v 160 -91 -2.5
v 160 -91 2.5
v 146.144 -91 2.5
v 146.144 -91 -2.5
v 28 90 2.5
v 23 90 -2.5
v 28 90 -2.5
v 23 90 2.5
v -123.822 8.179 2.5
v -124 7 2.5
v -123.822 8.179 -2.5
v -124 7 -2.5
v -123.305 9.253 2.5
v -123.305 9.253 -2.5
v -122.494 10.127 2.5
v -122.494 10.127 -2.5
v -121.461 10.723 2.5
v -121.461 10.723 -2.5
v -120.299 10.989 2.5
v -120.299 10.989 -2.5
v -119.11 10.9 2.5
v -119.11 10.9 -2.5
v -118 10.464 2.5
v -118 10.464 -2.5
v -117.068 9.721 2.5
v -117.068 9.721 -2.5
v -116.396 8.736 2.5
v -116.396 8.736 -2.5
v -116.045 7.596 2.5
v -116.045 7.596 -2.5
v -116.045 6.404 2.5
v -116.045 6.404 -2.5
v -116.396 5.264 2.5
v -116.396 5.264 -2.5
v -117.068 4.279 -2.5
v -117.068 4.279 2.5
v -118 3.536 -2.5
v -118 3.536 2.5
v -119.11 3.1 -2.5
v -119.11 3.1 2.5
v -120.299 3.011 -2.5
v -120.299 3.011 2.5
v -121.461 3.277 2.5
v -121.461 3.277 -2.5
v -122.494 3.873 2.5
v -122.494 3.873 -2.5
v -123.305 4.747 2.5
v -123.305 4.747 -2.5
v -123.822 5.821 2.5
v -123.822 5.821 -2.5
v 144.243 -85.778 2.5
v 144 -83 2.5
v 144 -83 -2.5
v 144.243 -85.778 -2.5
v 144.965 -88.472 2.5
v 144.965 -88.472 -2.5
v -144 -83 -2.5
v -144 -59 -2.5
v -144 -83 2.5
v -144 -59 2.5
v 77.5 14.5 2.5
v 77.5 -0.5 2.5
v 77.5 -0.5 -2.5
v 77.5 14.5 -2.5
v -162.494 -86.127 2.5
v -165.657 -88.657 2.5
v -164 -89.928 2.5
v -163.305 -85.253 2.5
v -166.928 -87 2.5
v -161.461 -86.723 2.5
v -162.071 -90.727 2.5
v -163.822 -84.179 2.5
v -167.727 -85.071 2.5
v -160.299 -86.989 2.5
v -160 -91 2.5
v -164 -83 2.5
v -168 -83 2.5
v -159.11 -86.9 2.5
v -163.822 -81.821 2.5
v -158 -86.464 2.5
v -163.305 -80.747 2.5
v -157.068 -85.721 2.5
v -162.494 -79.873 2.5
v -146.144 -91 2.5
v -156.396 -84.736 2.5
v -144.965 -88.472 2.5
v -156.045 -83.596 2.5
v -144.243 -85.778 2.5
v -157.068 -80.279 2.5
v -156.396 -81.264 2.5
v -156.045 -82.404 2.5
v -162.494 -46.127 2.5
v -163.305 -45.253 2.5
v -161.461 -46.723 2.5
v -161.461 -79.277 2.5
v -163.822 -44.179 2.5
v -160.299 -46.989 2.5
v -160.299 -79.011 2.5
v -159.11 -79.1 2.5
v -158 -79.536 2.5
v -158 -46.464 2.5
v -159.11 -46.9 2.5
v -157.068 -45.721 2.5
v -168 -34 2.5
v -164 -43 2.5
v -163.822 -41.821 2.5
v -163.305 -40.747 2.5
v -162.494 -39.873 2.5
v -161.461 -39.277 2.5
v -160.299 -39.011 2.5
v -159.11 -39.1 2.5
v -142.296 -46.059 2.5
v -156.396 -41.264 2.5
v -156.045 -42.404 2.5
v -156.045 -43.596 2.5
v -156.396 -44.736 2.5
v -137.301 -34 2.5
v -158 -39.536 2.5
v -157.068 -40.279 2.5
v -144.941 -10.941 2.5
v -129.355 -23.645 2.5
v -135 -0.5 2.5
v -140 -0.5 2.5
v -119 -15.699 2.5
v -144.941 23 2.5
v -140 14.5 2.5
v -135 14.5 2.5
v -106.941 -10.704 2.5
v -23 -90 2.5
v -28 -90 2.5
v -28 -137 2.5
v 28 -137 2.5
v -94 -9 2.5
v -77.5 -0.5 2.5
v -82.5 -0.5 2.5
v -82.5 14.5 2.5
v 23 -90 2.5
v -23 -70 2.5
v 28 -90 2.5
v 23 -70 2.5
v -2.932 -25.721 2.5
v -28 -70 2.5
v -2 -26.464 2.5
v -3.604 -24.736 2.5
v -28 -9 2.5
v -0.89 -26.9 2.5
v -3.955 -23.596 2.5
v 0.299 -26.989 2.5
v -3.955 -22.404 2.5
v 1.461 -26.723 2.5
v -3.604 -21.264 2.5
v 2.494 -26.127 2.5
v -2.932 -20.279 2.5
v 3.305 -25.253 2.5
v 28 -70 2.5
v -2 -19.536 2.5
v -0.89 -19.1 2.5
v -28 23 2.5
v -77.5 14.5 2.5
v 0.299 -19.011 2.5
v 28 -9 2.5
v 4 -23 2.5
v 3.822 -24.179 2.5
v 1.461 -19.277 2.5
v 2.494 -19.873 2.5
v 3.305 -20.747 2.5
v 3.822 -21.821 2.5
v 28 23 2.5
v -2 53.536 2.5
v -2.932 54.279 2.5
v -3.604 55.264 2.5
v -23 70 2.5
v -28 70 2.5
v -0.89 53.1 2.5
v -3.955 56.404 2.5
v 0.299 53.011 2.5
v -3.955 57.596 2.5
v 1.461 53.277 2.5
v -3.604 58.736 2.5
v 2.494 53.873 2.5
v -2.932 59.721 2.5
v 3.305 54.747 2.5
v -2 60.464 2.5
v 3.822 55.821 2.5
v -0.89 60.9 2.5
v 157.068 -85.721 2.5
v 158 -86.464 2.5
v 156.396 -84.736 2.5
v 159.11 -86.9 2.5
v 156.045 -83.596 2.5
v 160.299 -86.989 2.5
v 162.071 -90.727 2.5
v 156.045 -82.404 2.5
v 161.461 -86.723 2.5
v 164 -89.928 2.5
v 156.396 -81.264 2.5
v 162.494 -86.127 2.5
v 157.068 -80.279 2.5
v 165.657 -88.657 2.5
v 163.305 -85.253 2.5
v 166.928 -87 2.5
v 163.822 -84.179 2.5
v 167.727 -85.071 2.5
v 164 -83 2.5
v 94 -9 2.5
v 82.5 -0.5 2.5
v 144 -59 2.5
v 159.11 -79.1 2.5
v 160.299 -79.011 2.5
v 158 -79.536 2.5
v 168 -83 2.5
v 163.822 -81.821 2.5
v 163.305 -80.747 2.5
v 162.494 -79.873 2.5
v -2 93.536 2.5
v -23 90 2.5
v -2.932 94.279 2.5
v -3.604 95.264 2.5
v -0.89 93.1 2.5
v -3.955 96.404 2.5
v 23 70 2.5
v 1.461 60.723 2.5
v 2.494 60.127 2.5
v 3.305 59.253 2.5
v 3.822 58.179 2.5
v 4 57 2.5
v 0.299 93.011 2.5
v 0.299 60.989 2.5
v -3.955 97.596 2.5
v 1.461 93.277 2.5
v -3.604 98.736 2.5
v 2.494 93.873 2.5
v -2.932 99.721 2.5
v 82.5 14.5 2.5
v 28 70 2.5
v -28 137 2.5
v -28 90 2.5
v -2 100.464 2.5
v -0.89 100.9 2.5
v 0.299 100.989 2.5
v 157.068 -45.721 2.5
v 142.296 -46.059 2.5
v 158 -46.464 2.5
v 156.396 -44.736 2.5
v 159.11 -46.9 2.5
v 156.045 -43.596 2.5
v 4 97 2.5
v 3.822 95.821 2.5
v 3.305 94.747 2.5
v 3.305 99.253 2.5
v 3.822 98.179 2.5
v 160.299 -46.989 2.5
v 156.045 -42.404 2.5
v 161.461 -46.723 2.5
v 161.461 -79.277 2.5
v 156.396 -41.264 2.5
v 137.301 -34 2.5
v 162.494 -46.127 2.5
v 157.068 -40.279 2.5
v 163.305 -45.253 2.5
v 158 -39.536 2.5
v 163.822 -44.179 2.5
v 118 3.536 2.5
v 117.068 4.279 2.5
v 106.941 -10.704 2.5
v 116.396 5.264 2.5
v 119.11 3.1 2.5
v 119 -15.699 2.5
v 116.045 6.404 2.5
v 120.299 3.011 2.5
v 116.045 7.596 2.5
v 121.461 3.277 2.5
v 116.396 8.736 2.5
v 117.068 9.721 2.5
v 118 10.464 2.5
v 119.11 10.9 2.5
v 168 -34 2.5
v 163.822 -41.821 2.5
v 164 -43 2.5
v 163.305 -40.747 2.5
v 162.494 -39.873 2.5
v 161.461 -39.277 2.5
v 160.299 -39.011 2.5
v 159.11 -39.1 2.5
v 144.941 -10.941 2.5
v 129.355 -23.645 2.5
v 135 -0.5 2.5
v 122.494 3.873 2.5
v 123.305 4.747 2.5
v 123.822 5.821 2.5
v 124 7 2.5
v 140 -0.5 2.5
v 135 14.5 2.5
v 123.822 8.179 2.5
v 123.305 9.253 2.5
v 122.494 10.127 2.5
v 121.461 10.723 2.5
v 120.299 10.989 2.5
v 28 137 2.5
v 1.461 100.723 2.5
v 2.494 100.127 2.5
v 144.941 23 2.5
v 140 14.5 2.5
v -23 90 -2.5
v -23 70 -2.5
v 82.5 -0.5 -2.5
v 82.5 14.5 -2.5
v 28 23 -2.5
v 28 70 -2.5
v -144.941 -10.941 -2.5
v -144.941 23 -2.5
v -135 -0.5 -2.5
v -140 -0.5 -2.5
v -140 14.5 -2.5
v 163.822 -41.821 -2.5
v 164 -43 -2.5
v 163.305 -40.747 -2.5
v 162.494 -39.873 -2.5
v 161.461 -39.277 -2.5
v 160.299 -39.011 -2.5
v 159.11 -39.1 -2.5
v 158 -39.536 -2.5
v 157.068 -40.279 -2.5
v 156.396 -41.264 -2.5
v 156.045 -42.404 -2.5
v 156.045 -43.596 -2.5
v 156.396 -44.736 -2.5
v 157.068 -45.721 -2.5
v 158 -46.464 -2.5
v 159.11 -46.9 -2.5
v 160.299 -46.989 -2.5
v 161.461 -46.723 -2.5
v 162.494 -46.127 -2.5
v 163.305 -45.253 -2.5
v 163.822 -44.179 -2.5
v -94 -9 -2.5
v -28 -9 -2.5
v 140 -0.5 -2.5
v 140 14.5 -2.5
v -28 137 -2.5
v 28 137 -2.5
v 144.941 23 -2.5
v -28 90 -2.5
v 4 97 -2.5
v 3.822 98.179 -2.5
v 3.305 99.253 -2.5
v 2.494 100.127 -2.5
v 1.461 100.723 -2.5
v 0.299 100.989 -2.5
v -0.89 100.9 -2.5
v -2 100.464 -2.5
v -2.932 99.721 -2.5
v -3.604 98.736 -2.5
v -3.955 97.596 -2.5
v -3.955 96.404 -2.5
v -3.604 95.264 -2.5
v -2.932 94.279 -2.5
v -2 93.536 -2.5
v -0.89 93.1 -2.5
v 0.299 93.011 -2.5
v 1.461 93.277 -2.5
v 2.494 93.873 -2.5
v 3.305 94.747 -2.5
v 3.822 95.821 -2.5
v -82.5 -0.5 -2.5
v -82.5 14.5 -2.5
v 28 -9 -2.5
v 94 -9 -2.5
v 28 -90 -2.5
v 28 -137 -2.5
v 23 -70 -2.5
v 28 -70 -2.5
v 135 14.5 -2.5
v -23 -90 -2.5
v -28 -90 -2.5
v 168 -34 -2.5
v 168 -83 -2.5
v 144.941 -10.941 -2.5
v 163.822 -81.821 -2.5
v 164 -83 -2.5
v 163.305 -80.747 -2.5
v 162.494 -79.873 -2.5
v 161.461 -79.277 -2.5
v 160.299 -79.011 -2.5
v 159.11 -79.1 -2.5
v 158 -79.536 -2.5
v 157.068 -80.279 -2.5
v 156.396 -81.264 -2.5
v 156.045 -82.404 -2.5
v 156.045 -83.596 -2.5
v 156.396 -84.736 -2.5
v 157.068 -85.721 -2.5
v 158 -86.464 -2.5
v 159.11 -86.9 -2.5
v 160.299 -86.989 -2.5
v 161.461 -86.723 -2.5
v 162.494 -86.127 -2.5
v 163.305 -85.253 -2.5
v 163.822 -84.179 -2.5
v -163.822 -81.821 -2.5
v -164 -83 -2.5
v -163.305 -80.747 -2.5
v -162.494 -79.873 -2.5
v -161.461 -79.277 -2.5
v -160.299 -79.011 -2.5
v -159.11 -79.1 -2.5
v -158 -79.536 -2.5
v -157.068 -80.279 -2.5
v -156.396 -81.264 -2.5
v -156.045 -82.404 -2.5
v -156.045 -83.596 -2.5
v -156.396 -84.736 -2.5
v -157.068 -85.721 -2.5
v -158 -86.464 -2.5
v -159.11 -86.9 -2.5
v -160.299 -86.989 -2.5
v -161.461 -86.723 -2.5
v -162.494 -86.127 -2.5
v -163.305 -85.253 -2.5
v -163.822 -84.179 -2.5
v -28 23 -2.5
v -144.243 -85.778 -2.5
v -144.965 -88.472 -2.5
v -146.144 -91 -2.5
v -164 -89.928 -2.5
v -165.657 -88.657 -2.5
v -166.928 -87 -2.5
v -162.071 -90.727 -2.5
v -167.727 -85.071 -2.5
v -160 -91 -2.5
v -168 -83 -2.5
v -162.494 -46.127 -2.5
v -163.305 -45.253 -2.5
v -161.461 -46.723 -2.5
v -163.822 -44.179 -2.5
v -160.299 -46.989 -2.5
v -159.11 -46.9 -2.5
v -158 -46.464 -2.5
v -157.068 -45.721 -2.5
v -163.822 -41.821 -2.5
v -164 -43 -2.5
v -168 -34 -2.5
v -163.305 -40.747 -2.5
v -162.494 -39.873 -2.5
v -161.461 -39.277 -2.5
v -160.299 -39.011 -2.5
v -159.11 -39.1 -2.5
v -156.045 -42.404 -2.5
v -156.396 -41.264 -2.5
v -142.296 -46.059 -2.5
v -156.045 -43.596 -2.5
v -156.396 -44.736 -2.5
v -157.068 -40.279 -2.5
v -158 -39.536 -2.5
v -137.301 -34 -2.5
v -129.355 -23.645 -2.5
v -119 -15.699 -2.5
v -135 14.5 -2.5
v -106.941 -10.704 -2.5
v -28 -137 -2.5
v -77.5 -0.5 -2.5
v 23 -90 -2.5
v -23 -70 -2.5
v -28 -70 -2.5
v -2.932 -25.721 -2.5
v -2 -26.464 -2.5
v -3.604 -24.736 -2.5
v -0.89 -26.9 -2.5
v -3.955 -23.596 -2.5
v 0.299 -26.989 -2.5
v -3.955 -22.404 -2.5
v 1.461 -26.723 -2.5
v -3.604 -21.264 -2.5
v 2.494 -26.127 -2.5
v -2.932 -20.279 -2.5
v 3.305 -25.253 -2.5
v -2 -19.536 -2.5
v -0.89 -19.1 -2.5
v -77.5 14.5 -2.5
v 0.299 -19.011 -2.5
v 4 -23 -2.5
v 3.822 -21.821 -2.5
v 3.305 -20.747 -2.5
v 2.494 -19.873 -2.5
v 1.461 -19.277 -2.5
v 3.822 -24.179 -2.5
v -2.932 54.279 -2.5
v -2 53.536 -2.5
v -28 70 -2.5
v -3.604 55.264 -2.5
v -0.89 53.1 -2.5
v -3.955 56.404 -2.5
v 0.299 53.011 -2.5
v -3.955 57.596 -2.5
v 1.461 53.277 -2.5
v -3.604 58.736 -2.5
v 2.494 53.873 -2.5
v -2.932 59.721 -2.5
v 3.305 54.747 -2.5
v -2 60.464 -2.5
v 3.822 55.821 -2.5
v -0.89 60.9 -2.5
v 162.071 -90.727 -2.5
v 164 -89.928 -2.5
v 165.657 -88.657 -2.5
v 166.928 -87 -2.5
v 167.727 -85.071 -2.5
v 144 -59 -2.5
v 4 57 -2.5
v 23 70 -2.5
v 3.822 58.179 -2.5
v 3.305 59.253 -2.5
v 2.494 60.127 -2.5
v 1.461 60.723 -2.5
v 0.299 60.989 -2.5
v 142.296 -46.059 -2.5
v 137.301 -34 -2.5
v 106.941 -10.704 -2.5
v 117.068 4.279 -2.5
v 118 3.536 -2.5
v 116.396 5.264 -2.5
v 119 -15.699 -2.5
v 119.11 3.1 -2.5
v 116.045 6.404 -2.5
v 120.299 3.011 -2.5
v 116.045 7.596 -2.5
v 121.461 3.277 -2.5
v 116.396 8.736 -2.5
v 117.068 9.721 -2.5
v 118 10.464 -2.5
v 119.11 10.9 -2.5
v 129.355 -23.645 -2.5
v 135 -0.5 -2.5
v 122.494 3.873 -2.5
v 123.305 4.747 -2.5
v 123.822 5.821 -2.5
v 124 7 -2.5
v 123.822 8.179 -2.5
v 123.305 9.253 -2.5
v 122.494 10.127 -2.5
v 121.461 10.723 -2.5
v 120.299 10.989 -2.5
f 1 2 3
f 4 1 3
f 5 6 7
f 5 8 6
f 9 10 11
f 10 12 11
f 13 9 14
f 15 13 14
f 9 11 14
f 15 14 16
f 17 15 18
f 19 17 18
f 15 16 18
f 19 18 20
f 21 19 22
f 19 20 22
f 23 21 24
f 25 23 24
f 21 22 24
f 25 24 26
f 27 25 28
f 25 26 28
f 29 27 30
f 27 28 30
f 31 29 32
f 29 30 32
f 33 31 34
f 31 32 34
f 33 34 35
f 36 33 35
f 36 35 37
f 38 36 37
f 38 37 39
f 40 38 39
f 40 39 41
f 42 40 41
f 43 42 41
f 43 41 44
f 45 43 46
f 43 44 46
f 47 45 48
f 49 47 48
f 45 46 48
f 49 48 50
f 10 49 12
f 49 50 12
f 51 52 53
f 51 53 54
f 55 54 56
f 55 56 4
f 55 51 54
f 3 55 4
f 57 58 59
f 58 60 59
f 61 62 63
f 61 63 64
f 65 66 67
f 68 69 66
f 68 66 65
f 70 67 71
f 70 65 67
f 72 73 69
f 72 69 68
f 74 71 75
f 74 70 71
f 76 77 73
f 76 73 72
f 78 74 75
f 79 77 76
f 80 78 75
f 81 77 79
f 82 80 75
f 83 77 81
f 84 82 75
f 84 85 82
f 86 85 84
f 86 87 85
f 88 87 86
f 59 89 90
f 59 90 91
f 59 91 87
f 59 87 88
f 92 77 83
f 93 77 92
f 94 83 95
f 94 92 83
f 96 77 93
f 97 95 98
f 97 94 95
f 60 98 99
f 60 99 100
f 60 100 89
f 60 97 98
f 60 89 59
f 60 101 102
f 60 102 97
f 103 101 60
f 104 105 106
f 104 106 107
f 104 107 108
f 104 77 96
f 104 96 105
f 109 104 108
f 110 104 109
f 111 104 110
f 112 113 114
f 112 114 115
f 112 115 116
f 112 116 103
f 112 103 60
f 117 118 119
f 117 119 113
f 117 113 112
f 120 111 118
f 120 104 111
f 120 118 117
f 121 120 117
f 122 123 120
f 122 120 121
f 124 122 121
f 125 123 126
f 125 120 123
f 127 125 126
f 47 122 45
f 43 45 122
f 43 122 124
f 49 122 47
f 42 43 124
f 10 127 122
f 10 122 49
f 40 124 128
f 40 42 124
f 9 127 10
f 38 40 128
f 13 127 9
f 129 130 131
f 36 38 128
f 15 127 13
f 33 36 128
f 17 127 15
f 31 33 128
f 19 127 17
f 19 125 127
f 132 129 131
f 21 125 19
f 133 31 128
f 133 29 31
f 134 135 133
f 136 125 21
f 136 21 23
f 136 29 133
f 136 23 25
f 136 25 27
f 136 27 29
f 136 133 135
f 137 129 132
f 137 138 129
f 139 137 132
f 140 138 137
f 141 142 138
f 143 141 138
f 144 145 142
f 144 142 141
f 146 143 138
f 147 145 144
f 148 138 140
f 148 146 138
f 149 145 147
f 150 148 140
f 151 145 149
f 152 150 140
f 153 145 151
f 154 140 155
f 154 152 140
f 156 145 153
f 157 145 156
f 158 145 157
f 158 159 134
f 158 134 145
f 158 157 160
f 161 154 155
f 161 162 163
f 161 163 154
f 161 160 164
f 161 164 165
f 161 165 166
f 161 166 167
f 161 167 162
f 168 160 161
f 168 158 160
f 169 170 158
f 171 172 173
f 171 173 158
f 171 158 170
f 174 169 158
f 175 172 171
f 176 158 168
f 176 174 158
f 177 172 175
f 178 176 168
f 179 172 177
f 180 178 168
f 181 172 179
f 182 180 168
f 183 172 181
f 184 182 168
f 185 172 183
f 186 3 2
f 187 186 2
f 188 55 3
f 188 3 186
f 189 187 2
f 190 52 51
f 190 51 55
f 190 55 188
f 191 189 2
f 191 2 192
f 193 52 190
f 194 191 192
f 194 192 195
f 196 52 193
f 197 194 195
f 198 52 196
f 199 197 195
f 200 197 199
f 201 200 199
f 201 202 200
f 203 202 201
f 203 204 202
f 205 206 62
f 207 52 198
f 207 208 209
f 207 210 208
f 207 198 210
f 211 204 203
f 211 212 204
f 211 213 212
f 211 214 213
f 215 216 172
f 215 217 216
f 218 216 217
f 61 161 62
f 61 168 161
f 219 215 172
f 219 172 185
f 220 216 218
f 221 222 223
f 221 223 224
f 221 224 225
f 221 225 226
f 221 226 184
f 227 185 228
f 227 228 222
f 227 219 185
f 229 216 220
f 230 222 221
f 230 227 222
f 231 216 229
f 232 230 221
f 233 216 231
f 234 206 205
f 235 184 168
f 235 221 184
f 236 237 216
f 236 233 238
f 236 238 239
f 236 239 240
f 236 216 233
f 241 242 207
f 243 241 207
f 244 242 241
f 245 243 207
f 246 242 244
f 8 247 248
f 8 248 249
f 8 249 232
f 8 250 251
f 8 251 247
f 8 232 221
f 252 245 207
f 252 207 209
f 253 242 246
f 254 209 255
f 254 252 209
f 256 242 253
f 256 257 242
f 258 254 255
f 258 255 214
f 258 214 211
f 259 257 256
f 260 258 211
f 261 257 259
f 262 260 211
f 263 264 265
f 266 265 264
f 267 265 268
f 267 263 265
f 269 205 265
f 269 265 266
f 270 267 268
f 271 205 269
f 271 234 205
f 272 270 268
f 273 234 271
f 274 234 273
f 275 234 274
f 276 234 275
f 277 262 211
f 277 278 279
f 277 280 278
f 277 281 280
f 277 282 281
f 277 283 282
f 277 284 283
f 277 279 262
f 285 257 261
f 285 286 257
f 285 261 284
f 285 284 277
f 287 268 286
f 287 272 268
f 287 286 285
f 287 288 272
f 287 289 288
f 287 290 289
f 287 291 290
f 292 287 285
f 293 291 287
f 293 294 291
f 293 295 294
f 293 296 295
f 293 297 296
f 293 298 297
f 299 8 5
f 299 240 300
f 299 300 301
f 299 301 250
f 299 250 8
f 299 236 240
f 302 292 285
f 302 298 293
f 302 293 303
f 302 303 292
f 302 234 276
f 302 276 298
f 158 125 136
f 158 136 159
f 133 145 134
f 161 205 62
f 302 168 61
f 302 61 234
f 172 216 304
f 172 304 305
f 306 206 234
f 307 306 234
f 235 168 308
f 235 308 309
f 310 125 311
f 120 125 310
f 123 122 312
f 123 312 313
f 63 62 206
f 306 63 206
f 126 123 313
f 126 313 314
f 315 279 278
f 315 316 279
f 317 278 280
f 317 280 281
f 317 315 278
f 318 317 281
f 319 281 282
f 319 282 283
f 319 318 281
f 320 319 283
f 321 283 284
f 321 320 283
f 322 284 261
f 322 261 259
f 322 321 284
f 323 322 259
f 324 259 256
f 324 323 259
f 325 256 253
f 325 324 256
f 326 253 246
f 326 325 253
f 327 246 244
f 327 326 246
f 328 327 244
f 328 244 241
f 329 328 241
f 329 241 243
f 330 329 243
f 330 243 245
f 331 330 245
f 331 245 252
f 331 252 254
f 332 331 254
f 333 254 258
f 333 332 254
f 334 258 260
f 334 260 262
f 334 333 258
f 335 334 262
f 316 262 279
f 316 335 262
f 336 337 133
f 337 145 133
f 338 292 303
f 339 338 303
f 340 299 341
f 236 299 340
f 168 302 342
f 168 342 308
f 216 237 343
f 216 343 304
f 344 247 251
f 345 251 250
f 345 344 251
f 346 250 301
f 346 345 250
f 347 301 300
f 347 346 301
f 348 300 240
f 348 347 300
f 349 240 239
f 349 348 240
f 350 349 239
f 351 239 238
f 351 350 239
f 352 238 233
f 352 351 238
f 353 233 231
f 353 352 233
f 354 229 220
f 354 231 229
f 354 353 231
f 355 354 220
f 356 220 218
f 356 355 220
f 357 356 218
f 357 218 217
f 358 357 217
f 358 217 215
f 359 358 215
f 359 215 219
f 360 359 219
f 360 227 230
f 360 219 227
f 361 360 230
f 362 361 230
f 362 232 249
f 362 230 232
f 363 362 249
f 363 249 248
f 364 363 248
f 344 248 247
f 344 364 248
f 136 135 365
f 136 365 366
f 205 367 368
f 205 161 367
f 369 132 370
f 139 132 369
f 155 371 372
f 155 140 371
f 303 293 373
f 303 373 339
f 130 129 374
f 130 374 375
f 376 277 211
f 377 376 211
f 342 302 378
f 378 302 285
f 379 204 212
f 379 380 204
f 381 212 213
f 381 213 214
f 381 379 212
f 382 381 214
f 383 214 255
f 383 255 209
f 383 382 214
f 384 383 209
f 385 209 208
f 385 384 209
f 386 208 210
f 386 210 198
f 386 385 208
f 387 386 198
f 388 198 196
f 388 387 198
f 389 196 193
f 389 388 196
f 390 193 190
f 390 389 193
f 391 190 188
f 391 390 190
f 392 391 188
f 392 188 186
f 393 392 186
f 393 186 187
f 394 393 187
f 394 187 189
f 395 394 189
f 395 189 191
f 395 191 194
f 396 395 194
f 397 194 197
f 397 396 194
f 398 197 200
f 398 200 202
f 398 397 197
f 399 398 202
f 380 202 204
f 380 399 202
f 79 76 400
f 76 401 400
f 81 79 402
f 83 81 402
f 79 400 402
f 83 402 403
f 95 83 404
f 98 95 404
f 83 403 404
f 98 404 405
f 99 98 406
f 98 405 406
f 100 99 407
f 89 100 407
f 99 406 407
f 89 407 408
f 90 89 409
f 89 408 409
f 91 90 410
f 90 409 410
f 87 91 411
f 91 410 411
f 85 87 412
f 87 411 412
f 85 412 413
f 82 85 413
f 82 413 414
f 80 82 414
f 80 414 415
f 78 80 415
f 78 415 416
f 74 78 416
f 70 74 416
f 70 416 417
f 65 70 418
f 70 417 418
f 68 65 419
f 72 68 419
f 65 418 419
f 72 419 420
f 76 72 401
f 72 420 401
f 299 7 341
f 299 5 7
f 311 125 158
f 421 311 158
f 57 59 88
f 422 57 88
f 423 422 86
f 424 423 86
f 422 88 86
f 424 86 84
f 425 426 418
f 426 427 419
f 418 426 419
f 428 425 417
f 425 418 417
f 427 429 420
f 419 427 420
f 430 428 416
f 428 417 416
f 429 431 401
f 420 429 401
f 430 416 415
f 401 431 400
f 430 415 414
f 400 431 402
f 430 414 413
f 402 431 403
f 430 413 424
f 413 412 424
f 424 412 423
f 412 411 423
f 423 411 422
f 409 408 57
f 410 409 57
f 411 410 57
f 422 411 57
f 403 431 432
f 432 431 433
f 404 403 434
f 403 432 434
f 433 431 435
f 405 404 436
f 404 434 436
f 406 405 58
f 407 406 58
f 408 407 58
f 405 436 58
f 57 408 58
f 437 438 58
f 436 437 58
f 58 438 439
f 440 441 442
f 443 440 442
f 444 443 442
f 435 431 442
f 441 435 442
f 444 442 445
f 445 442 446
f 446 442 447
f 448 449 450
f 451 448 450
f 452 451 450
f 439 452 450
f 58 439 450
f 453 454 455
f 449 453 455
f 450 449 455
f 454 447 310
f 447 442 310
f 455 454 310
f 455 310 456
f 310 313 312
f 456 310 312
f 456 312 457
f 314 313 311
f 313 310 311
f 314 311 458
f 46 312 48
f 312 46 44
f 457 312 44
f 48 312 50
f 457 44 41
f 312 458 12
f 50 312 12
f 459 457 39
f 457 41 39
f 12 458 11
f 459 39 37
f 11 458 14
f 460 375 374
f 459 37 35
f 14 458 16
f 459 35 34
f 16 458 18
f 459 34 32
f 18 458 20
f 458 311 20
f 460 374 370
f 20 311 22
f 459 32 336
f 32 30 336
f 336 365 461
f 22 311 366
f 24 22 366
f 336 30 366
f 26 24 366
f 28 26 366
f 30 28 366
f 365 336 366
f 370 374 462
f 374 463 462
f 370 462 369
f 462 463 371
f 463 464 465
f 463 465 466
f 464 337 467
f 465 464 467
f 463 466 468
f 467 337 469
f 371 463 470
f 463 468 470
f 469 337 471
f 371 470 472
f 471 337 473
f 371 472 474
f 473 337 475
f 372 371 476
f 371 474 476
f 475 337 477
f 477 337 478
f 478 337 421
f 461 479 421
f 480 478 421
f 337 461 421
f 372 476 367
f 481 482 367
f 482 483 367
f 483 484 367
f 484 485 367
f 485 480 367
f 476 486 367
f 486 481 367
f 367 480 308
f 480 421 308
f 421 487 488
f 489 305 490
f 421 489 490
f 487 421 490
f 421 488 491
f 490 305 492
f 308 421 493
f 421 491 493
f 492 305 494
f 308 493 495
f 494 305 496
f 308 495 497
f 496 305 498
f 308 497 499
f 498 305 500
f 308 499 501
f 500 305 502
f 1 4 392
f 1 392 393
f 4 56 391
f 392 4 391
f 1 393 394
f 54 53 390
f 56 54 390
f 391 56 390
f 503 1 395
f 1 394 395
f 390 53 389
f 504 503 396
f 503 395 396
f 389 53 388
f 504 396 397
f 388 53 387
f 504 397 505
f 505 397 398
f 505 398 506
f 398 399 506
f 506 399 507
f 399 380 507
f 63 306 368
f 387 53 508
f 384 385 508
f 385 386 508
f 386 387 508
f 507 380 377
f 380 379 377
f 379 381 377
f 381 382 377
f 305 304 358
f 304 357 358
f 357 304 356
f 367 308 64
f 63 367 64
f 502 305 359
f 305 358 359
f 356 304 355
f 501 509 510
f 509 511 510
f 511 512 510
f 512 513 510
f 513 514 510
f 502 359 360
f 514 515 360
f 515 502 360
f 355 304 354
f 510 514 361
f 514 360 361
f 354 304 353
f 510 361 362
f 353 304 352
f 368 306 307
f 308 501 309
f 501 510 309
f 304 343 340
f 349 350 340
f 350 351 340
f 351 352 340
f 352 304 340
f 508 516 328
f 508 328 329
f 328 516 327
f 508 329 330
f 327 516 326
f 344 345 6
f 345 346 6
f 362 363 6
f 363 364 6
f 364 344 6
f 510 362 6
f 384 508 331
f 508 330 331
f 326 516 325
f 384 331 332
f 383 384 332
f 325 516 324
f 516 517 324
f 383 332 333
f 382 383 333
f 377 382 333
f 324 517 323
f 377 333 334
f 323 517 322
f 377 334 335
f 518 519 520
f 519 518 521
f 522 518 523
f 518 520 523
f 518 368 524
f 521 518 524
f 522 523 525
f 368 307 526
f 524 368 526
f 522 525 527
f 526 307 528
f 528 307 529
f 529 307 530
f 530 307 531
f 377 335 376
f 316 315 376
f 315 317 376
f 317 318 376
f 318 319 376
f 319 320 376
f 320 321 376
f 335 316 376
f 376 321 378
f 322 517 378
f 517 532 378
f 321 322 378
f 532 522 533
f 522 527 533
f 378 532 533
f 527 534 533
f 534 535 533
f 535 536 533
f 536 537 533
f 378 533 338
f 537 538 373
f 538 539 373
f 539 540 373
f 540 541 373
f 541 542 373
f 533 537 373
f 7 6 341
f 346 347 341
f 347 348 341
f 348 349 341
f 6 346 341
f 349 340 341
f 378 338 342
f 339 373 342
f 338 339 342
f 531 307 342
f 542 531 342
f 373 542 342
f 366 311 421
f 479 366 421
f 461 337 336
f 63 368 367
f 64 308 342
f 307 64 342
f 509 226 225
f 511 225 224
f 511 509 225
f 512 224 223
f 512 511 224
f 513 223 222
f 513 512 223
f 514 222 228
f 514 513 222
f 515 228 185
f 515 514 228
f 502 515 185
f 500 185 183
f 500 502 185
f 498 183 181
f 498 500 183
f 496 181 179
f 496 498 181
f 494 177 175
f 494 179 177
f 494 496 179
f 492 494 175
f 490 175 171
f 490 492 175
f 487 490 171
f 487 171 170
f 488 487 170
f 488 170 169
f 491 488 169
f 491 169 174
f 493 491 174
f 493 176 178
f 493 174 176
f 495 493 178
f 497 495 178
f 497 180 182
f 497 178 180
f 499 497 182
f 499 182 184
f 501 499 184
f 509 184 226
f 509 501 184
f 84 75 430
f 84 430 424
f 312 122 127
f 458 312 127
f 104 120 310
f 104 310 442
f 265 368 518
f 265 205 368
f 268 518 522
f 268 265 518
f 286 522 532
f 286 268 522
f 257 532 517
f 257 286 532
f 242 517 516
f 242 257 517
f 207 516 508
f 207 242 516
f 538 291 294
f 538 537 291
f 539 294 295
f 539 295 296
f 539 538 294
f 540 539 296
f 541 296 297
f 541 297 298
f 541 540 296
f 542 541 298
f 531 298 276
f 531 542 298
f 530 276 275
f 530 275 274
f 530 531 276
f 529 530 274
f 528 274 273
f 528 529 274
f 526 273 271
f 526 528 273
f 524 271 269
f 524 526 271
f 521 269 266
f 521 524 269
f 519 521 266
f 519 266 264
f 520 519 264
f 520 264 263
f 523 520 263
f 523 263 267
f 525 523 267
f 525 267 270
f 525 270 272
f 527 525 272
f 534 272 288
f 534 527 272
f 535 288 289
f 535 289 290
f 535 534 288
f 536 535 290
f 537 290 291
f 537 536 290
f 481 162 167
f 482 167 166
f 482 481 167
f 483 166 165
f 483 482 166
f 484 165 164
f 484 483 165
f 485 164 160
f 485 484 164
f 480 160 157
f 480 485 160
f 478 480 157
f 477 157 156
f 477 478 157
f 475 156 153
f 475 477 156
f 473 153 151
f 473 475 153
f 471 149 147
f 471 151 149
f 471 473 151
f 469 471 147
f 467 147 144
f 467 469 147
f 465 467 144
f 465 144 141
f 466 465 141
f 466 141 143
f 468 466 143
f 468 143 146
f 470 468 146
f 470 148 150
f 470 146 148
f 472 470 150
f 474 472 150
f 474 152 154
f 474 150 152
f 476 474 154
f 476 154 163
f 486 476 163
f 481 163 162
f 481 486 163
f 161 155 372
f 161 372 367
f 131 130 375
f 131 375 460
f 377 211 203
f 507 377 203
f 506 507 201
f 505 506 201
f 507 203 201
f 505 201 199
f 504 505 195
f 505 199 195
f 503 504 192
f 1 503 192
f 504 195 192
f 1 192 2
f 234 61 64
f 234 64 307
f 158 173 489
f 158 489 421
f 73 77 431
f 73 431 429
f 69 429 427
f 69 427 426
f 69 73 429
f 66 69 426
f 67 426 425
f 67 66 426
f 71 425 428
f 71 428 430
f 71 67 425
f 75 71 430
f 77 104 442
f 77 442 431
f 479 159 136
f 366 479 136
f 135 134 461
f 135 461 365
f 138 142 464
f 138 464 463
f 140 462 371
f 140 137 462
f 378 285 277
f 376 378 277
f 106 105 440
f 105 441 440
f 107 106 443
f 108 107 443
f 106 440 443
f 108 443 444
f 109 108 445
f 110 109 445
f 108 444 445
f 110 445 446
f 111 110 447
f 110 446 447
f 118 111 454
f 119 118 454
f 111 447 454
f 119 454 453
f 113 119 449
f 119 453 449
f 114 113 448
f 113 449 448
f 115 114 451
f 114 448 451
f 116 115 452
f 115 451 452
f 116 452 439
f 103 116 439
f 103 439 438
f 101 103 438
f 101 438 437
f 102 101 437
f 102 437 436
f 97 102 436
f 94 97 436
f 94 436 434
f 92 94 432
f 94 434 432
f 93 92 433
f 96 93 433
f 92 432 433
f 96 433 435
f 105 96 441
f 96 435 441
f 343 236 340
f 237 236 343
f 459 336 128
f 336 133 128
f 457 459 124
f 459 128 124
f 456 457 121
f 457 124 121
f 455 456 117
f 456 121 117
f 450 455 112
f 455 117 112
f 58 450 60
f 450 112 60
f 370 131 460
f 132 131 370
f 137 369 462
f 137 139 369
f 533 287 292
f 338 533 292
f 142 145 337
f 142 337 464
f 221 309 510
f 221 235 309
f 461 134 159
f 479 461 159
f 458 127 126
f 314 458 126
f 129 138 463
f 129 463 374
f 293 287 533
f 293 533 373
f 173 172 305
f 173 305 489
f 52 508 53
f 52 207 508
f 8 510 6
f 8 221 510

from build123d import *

# Parameters (mm, degrees)
SKETCH1_R           = 4
BOSS_EXTRUDE1_DEPTH = 2.5
SKETCH2_R           = 4
BOSS_EXTRUDE2_DEPTH = 2.5
SKETCH3_W           = 5
SKETCH3_H           = 15
CUT_EXTRUDE1_DEPTH  = 5


with BuildPart() as part:
    # Sketch1 → Boss-Extrude1 (new, symmetric)
    with BuildSketch(Plane.XY):
        Polygon((28, 137), (-28, 137), (-28, 90), (-23, 90), (-23, 70), (-28, 70), (-28, -70), (-23, -70), (-23, -90), (-28, -90), (-28, -137), (28, -137), (28, -90), (23, -90), (23, -70), (28, -70), (28, 70), (23, 70), (23, 90), (28, 90), align=None)
        with Locations((0, -23)):
            Circle(SKETCH1_R, mode=Mode.SUBTRACT)
        with Locations((0, 57)):
            Circle(SKETCH1_R, mode=Mode.SUBTRACT)
        with Locations((0, 97)):
            Circle(SKETCH1_R, mode=Mode.SUBTRACT)
    extrude(amount=BOSS_EXTRUDE1_DEPTH, both=True)

    # Sketch2 → Boss-Extrude2 (add, symmetric)
    with BuildSketch(Plane.XY):
        with BuildLine():
            Line((144, -59), (144, -83))
            ThreePointArc((144, -83), (160, -99), (176, -83))
            Line((176, -83), (176, 23))
            Line((176, 23), (120, 23))
            Line((120, 23), (28, 23))
            Line((28, 23), (28, -9))
            Line((28, -9), (94, -9))
            ThreePointArc((94, -9), (129.355339059, -23.644660941), (144, -59))
        make_face()
        with Locations((120, 7)):
            Circle(SKETCH2_R, mode=Mode.SUBTRACT)
        with Locations((160, -43)):
            Circle(SKETCH2_R, mode=Mode.SUBTRACT)
        with Locations((160, -83)):
            Circle(SKETCH2_R, mode=Mode.SUBTRACT)
    extrude(amount=BOSS_EXTRUDE2_DEPTH, both=True)

    # Sketch3 → Cut-Extrude1 (cut)
    with BuildSketch(Plane.XY.offset(2.5)):
        with BuildLine():
            ThreePointArc((168, -83), (165.656854249, -88.656854249), (160, -91))
            Line((160, -91), (146.143593539, -91))
            ThreePointArc((146.143593539, -91), (164.141104722, -98.454813221), (176, -83))
            Line((176, -83), (176, 23))
            Line((176, 23), (144.94116403, 23))
            Line((144.94116403, 23), (144.94116403, -10.94116403))
            Line((144.94116403, -10.94116403), (168, -34))
            Line((168, -34), (168, -83))
        make_face()
        with Locations((137.5, 7)):
            Rectangle(SKETCH3_W, SKETCH3_H)
        with Locations((80, 7)):
            Rectangle(SKETCH3_W, SKETCH3_H)
    extrude(amount=-CUT_EXTRUDE1_DEPTH, mode=Mode.SUBTRACT)

    # Mirror2: part across plane


with BuildPart() as part_1:
    add(part.part)
    add(part.part.mirror(Plane(origin=(0, 0, 0), x_dir=(0, 0, 1), z_dir=(1, 0, 0))))


solid = part_1.part
